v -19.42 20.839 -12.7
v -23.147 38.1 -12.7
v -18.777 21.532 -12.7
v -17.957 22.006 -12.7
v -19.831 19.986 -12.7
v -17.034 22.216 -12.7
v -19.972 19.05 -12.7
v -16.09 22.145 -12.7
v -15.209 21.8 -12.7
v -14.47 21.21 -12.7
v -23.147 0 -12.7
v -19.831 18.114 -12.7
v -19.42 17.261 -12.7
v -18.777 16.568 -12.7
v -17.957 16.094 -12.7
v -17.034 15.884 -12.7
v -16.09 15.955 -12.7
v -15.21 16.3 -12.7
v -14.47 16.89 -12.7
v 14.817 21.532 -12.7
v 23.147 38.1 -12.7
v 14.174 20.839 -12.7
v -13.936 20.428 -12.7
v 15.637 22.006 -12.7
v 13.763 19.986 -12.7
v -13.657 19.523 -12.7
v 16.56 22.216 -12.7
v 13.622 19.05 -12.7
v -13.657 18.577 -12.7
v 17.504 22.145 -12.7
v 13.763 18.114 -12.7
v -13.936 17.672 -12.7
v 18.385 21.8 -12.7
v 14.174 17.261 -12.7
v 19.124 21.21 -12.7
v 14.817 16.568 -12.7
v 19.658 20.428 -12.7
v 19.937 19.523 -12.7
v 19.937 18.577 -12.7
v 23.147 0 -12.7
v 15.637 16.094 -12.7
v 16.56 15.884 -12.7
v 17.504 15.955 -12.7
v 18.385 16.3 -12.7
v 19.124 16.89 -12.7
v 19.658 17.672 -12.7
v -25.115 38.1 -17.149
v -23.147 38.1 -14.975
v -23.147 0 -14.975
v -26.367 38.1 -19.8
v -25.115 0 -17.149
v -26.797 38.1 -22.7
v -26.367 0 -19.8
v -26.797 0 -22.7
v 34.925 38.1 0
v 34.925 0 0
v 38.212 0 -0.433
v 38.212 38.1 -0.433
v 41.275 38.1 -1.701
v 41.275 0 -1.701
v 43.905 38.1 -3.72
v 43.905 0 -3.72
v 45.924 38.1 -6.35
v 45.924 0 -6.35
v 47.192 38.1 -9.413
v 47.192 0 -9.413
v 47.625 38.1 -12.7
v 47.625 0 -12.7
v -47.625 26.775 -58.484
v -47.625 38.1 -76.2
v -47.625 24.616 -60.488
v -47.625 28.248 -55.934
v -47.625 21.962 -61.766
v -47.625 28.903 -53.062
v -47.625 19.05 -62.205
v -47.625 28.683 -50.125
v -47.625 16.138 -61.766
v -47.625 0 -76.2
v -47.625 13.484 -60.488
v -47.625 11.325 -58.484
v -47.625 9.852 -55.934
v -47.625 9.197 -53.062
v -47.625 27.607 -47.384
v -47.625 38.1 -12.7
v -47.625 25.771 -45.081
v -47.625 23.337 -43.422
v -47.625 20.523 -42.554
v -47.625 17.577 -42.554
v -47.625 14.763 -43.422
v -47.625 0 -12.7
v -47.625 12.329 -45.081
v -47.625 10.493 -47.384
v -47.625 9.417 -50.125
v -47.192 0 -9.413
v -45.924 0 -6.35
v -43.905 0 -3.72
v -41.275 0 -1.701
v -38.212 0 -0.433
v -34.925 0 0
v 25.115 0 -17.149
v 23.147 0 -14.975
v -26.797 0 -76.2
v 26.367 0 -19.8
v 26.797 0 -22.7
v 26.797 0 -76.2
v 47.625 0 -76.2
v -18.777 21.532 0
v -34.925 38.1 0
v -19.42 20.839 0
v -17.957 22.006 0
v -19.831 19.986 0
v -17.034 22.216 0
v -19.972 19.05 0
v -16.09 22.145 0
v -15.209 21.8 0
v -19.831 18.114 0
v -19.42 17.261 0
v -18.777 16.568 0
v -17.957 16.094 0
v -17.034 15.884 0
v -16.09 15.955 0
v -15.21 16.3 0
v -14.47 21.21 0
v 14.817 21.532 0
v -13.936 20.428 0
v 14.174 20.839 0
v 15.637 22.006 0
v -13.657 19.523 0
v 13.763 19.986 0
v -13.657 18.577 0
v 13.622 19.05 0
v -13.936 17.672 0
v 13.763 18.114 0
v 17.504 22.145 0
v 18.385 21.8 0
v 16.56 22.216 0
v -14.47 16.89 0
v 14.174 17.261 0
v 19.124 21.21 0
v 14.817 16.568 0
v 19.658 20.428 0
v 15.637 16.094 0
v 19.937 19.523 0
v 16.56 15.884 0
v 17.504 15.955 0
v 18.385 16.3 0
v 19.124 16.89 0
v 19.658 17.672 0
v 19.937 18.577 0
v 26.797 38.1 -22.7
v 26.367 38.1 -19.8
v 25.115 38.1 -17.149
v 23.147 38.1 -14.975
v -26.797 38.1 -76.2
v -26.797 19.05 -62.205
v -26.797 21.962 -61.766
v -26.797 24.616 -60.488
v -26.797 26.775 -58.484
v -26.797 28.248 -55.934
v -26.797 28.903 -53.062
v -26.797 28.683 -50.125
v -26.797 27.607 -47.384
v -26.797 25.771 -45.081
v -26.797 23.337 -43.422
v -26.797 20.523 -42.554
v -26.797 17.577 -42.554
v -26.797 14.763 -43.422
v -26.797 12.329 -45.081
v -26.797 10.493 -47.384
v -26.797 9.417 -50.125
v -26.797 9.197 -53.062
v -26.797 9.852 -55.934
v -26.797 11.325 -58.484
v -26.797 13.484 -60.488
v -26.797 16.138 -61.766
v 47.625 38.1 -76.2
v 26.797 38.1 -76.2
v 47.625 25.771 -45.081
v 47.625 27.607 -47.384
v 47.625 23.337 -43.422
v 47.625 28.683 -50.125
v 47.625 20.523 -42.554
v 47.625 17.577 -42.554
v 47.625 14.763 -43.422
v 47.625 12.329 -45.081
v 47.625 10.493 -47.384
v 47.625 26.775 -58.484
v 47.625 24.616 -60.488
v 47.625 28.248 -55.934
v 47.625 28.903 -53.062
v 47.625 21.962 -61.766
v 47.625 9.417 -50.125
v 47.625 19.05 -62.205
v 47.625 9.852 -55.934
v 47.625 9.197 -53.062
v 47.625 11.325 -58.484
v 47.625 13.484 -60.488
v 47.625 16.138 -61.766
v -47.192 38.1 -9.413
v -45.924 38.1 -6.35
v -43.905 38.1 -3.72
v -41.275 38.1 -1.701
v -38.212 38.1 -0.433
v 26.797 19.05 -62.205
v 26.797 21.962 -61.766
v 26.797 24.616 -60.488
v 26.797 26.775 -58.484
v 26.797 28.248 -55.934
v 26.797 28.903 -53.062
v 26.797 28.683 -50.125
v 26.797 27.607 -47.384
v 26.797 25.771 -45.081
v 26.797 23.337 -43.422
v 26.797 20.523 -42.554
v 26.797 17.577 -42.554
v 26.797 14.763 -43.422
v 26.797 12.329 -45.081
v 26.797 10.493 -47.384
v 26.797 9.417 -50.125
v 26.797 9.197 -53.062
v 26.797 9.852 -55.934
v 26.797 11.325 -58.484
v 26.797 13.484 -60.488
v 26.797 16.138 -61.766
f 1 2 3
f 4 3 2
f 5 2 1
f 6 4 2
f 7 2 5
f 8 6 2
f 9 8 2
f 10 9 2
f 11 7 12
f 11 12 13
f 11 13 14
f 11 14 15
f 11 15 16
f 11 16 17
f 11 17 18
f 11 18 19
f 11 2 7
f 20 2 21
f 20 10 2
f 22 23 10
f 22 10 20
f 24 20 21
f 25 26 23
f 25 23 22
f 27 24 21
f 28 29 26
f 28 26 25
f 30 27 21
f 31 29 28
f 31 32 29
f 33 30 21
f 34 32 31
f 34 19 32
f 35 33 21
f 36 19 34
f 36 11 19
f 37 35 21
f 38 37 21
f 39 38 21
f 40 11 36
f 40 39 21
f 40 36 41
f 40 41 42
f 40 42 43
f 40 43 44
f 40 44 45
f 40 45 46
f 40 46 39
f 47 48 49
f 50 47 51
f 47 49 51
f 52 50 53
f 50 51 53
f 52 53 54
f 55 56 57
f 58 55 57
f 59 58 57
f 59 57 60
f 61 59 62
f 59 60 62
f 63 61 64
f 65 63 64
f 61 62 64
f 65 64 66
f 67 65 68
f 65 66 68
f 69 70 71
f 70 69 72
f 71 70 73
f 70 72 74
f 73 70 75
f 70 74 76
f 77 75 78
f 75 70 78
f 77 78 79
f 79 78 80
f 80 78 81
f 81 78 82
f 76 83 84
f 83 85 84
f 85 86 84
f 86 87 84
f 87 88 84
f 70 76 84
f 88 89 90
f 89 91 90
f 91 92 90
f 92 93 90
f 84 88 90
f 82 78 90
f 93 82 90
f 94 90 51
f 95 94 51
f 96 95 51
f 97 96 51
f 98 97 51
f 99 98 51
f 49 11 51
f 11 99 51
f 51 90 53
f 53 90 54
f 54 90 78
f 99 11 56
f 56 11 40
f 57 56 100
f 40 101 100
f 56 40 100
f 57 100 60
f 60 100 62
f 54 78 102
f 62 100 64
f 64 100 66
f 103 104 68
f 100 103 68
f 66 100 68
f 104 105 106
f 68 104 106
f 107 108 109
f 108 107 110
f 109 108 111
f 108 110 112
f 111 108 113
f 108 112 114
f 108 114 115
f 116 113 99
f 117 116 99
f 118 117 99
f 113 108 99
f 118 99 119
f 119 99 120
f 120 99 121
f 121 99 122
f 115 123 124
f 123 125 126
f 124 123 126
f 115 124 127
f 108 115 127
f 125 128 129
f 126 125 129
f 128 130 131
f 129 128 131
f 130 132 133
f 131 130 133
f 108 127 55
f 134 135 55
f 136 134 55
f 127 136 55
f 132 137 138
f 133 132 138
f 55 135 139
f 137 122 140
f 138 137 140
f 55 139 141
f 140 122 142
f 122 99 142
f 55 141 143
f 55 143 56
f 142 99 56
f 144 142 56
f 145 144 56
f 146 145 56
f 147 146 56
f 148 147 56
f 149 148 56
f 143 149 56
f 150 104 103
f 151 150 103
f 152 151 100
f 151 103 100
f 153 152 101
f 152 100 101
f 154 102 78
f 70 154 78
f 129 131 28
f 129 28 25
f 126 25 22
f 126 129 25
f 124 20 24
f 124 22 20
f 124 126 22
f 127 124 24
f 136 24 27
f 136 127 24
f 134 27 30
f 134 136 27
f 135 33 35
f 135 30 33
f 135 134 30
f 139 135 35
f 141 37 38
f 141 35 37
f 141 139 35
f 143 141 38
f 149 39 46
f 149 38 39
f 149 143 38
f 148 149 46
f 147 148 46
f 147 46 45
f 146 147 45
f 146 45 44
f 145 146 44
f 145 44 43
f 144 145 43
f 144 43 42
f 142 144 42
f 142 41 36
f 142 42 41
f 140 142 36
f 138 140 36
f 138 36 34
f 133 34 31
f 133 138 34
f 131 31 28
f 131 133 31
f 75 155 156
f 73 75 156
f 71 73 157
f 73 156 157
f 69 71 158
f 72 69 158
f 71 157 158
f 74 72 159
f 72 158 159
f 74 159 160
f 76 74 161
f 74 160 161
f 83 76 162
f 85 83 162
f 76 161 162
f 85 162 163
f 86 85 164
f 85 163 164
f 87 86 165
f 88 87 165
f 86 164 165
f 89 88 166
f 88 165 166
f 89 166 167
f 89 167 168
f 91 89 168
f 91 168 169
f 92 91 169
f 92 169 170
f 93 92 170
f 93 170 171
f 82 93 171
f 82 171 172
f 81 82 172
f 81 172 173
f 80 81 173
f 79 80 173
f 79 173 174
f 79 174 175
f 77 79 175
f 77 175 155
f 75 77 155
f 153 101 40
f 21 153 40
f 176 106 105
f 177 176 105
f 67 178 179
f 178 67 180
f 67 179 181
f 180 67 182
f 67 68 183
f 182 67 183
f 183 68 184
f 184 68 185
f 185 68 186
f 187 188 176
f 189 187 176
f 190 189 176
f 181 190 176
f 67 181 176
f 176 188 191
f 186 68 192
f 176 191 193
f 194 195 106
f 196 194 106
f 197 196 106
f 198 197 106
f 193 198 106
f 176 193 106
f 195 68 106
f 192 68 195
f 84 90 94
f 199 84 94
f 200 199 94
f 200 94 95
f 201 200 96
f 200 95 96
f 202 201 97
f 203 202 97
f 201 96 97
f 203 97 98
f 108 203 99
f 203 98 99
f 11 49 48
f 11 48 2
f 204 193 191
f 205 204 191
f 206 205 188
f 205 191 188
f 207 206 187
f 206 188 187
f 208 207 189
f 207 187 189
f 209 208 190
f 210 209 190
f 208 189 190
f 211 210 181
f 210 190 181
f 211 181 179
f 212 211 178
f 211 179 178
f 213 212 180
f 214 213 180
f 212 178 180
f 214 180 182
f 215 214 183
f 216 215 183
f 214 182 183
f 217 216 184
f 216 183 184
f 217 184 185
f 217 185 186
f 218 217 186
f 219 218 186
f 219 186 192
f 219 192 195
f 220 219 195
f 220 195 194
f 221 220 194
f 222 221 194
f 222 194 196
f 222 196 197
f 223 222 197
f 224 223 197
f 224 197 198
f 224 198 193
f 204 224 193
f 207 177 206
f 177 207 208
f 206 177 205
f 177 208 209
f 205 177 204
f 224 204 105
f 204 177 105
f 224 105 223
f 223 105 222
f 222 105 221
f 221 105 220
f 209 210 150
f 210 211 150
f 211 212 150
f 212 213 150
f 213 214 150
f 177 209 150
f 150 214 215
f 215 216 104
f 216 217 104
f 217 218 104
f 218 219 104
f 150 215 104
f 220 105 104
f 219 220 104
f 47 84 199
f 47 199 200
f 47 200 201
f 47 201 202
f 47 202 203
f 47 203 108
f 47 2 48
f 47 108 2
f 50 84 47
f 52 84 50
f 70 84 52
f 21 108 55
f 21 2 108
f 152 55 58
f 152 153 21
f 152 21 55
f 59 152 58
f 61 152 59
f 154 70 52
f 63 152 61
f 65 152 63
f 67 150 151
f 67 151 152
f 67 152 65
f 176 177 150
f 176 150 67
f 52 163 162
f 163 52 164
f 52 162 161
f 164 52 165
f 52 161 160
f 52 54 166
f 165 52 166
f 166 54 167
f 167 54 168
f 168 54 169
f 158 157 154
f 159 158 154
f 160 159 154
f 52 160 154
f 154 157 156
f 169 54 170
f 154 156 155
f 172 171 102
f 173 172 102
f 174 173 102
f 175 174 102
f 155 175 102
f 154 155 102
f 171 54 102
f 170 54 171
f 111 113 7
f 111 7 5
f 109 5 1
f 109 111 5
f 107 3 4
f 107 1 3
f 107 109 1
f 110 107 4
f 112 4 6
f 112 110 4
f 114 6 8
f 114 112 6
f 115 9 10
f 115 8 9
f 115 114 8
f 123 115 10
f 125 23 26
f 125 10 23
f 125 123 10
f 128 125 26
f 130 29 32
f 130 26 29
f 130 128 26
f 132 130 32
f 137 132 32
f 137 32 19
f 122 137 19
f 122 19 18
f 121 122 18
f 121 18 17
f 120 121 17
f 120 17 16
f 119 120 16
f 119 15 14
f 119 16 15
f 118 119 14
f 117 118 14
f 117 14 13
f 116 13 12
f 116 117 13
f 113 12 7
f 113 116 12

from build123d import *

# Parameters (mm, degrees)
BOSS_EXTRUDE1_DEPTH     = 38.1
SKETCH2_R               = 9.8806
CUT_EXTRUDE1_DEPTH      = 128.791284914
CUT_EXTRUDE2_DEPTH      = 89.045446362
CUT_EXTRUDE2_DEPTH_BACK = 89.045446362
SKETCH3_R               = 3.175
SKETCH4_W               = 46.294
SKETCH4_H               = 2.54
CUT_EXTRUDE3_DEPTH      = 98.602206085


with BuildPart() as part:
    # Sketch1 → Boss-Extrude1 (new body)
    with BuildSketch(Plane(origin=(0, 0, 0), x_dir=(1, 0, 0), z_dir=(0, 1, 0))):
        with BuildLine():
            Line((-47.625, 76.2), (-47.625, 12.7))
            ThreePointArc((-47.625, 12.7), (-43.905256121, 3.719743879), (-34.925, 0))
            Line((-34.925, 0), (34.925, 0))
            ThreePointArc((34.925, 0), (43.905256121, 3.719743879), (47.625, 12.7))
            Line((47.625, 12.7), (47.625, 76.2))
            Line((47.625, 76.2), (26.797, 76.2))
            Line((26.797, 76.2), (26.797, 22.7))
            ThreePointArc((26.797, 22.7), (23.868067812, 15.628932188), (16.797, 12.7))
            Line((16.797, 12.7), (-16.797, 12.7))
            ThreePointArc((-16.797, 12.7), (-23.868067812, 15.628932188), (-26.797, 22.7))
            Line((-26.797, 22.7), (-26.797, 76.2))
            Line((-26.797, 76.2), (-47.625, 76.2))
        make_face()
    extrude(amount=BOSS_EXTRUDE1_DEPTH)

    # Sketch2 → Cut-Extrude1 (cut, through all)
    with BuildSketch(Plane(origin=(47.625, 0, 0), x_dir=(0, 0, -1), z_dir=(1, 0, 0))):
        with Locations((52.324, 19.05)):
            Circle(SKETCH2_R)
    extrude(amount=-CUT_EXTRUDE1_DEPTH, mode=Mode.SUBTRACT)

    # Sketch3 → Cut-Extrude2 (cut, two sides: drawn at the far end of the back side and taken through both)
    with BuildSketch(Plane(origin=(0, 0, -12.7), x_dir=(-1, 0, 0), z_dir=(0, 0, -1)).offset(-CUT_EXTRUDE2_DEPTH_BACK)):
        with Locations((-16.797, 19.05)):
            Circle(SKETCH3_R)
        with Locations((16.797, 19.05)):
            Circle(SKETCH3_R)
    extrude(amount=CUT_EXTRUDE2_DEPTH + CUT_EXTRUDE2_DEPTH_BACK, mode=Mode.SUBTRACT)

    # Sketch4 → Cut-Extrude3 (cut, through all)
    with BuildSketch(Plane.XZ):
        with Locations((0, -13.97)):
            Rectangle(SKETCH4_W, SKETCH4_H)
    extrude(amount=-CUT_EXTRUDE3_DEPTH, mode=Mode.SUBTRACT)


solid = part.part
